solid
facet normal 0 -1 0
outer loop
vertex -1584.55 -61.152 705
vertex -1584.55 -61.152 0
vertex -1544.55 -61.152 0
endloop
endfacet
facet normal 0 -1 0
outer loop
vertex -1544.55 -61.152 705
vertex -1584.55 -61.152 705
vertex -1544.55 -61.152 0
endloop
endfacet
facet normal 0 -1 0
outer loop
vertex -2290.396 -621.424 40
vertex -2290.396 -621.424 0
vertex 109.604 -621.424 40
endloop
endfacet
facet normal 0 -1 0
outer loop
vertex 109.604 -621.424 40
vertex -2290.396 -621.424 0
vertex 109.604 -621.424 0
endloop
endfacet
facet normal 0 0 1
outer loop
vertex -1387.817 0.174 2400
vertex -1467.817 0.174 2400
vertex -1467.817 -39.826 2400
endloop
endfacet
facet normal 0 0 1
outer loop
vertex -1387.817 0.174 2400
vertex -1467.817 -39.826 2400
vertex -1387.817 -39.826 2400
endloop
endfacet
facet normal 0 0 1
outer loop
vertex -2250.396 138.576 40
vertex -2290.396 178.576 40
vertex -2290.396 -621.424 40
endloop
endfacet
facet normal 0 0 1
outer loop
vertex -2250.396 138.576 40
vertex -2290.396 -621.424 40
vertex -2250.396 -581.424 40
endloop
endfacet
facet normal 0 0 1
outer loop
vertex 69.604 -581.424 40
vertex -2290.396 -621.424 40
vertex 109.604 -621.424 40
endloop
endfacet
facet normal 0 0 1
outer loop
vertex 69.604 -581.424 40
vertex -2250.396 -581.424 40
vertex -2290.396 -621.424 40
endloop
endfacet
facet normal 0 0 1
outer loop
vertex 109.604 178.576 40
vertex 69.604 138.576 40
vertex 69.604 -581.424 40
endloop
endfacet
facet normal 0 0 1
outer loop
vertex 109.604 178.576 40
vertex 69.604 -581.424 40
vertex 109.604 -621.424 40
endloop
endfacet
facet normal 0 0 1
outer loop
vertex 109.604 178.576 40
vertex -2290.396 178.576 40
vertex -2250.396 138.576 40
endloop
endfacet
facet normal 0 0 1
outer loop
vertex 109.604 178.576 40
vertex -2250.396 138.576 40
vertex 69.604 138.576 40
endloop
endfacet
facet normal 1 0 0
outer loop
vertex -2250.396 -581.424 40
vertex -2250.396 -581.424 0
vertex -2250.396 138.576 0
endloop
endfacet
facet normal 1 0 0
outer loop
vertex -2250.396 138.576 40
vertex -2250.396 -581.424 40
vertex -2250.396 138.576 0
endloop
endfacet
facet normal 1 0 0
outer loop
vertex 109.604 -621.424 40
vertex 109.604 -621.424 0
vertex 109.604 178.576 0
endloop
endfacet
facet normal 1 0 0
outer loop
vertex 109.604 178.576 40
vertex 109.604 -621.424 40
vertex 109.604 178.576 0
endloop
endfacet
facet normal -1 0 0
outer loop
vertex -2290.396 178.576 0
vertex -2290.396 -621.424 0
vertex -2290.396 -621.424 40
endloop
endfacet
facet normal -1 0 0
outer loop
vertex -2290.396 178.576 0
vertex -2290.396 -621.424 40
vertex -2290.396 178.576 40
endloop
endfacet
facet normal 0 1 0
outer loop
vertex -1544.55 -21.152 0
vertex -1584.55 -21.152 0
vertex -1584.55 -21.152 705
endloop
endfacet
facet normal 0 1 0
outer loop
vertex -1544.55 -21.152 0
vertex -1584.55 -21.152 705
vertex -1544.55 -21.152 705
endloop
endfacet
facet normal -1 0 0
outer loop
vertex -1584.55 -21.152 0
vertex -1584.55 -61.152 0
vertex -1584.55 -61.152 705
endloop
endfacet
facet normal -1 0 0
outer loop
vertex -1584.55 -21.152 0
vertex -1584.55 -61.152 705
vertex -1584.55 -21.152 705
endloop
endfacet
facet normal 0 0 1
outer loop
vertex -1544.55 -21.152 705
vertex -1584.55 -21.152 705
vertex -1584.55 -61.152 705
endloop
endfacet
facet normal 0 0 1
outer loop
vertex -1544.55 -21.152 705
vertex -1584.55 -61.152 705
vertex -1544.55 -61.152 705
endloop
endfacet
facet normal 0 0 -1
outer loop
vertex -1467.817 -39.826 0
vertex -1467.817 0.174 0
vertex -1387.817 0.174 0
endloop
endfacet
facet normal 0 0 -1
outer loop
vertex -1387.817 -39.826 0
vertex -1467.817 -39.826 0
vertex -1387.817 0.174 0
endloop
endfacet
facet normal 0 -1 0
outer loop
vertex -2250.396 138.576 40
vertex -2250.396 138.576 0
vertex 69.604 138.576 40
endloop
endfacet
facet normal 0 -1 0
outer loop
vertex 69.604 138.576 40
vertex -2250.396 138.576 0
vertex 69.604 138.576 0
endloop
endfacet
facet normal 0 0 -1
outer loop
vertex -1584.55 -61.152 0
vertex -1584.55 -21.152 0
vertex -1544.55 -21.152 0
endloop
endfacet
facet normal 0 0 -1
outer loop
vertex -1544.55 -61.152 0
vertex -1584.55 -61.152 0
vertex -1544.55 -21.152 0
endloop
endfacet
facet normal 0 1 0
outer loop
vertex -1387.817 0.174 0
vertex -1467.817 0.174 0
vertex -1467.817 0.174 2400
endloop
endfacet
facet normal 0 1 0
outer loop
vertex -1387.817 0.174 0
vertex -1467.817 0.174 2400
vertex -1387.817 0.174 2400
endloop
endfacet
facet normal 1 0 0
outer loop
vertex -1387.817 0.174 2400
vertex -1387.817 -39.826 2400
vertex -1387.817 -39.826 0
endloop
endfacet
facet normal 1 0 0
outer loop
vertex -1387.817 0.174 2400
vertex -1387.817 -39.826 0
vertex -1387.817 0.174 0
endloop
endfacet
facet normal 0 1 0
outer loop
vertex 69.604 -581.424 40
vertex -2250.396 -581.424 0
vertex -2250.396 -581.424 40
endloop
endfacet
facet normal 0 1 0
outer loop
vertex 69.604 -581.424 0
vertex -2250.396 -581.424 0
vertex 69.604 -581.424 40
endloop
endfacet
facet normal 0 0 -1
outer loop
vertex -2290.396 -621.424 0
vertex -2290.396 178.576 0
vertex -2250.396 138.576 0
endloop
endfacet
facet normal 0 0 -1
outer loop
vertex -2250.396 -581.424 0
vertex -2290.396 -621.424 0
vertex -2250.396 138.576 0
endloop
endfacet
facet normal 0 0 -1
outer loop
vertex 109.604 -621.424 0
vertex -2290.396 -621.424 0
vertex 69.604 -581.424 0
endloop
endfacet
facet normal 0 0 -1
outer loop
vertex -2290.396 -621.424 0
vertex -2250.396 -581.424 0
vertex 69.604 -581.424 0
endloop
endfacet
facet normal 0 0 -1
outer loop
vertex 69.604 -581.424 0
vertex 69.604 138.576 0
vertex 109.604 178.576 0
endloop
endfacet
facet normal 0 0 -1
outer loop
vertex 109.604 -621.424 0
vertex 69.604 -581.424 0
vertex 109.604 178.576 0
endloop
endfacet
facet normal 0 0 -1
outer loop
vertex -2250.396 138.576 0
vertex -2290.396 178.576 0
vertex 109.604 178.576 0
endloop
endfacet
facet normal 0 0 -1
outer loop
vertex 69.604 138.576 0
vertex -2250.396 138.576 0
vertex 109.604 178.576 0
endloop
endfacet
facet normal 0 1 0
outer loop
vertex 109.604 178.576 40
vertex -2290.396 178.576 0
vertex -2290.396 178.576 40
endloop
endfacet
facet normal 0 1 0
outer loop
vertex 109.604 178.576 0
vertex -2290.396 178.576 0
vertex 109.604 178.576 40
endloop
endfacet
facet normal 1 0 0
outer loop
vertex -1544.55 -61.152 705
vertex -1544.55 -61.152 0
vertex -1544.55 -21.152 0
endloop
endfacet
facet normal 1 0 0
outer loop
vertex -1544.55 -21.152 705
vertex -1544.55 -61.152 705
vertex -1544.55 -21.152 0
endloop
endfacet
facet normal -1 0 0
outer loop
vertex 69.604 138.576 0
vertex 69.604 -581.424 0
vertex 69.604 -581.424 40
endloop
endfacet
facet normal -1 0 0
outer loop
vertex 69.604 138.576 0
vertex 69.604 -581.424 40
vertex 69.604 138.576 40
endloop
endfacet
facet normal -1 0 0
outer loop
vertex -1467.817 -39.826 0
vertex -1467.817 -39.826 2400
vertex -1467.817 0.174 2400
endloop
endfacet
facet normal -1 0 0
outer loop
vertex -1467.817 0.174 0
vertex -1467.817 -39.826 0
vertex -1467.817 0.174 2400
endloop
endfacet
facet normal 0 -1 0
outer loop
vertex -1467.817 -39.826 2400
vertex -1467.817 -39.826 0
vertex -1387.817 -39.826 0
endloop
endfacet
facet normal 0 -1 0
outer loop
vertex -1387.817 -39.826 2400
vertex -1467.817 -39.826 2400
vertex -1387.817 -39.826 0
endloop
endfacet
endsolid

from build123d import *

# Parameters (mm, degrees)
F0_W     = 2400
F0_H     = 800
F0_W_2   = 2320
F0_H_2   = 720
F1_DEPTH = 40
F2_W     = 40
F2_H     = 40
F3_DEPTH = 705
F4_W     = 80
F4_H     = 40
F5_DEPTH = 2400


with BuildPart() as f1:
    # F0 (on Top) → F1 (new body)
    with BuildSketch(Plane.XY):
        with Locations((-1090.395872, -221.42356)):
            Rectangle(F0_W, F0_H)
        with Locations((-1090.395872, -221.42356)):
            Rectangle(F0_W_2, F0_H_2, mode=Mode.SUBTRACT)
    extrude(amount=F1_DEPTH)


with BuildPart() as f3:
    # F2 (on Top) → F3 (new body)
    with BuildSketch(Plane.XY):
        with Locations((-1564.549923, -41.151882)):
            Rectangle(F2_W, F2_H)
    extrude(amount=F3_DEPTH)


with BuildPart() as f5:
    # F4 (on Top) → F5 (new body)
    with BuildSketch(Plane.XY):
        with Locations((-1427.817225, -19.825992)):
            Rectangle(F4_W, F4_H)
    extrude(amount=F5_DEPTH)


solid = Compound([f1.part, f3.part, f5.part])
